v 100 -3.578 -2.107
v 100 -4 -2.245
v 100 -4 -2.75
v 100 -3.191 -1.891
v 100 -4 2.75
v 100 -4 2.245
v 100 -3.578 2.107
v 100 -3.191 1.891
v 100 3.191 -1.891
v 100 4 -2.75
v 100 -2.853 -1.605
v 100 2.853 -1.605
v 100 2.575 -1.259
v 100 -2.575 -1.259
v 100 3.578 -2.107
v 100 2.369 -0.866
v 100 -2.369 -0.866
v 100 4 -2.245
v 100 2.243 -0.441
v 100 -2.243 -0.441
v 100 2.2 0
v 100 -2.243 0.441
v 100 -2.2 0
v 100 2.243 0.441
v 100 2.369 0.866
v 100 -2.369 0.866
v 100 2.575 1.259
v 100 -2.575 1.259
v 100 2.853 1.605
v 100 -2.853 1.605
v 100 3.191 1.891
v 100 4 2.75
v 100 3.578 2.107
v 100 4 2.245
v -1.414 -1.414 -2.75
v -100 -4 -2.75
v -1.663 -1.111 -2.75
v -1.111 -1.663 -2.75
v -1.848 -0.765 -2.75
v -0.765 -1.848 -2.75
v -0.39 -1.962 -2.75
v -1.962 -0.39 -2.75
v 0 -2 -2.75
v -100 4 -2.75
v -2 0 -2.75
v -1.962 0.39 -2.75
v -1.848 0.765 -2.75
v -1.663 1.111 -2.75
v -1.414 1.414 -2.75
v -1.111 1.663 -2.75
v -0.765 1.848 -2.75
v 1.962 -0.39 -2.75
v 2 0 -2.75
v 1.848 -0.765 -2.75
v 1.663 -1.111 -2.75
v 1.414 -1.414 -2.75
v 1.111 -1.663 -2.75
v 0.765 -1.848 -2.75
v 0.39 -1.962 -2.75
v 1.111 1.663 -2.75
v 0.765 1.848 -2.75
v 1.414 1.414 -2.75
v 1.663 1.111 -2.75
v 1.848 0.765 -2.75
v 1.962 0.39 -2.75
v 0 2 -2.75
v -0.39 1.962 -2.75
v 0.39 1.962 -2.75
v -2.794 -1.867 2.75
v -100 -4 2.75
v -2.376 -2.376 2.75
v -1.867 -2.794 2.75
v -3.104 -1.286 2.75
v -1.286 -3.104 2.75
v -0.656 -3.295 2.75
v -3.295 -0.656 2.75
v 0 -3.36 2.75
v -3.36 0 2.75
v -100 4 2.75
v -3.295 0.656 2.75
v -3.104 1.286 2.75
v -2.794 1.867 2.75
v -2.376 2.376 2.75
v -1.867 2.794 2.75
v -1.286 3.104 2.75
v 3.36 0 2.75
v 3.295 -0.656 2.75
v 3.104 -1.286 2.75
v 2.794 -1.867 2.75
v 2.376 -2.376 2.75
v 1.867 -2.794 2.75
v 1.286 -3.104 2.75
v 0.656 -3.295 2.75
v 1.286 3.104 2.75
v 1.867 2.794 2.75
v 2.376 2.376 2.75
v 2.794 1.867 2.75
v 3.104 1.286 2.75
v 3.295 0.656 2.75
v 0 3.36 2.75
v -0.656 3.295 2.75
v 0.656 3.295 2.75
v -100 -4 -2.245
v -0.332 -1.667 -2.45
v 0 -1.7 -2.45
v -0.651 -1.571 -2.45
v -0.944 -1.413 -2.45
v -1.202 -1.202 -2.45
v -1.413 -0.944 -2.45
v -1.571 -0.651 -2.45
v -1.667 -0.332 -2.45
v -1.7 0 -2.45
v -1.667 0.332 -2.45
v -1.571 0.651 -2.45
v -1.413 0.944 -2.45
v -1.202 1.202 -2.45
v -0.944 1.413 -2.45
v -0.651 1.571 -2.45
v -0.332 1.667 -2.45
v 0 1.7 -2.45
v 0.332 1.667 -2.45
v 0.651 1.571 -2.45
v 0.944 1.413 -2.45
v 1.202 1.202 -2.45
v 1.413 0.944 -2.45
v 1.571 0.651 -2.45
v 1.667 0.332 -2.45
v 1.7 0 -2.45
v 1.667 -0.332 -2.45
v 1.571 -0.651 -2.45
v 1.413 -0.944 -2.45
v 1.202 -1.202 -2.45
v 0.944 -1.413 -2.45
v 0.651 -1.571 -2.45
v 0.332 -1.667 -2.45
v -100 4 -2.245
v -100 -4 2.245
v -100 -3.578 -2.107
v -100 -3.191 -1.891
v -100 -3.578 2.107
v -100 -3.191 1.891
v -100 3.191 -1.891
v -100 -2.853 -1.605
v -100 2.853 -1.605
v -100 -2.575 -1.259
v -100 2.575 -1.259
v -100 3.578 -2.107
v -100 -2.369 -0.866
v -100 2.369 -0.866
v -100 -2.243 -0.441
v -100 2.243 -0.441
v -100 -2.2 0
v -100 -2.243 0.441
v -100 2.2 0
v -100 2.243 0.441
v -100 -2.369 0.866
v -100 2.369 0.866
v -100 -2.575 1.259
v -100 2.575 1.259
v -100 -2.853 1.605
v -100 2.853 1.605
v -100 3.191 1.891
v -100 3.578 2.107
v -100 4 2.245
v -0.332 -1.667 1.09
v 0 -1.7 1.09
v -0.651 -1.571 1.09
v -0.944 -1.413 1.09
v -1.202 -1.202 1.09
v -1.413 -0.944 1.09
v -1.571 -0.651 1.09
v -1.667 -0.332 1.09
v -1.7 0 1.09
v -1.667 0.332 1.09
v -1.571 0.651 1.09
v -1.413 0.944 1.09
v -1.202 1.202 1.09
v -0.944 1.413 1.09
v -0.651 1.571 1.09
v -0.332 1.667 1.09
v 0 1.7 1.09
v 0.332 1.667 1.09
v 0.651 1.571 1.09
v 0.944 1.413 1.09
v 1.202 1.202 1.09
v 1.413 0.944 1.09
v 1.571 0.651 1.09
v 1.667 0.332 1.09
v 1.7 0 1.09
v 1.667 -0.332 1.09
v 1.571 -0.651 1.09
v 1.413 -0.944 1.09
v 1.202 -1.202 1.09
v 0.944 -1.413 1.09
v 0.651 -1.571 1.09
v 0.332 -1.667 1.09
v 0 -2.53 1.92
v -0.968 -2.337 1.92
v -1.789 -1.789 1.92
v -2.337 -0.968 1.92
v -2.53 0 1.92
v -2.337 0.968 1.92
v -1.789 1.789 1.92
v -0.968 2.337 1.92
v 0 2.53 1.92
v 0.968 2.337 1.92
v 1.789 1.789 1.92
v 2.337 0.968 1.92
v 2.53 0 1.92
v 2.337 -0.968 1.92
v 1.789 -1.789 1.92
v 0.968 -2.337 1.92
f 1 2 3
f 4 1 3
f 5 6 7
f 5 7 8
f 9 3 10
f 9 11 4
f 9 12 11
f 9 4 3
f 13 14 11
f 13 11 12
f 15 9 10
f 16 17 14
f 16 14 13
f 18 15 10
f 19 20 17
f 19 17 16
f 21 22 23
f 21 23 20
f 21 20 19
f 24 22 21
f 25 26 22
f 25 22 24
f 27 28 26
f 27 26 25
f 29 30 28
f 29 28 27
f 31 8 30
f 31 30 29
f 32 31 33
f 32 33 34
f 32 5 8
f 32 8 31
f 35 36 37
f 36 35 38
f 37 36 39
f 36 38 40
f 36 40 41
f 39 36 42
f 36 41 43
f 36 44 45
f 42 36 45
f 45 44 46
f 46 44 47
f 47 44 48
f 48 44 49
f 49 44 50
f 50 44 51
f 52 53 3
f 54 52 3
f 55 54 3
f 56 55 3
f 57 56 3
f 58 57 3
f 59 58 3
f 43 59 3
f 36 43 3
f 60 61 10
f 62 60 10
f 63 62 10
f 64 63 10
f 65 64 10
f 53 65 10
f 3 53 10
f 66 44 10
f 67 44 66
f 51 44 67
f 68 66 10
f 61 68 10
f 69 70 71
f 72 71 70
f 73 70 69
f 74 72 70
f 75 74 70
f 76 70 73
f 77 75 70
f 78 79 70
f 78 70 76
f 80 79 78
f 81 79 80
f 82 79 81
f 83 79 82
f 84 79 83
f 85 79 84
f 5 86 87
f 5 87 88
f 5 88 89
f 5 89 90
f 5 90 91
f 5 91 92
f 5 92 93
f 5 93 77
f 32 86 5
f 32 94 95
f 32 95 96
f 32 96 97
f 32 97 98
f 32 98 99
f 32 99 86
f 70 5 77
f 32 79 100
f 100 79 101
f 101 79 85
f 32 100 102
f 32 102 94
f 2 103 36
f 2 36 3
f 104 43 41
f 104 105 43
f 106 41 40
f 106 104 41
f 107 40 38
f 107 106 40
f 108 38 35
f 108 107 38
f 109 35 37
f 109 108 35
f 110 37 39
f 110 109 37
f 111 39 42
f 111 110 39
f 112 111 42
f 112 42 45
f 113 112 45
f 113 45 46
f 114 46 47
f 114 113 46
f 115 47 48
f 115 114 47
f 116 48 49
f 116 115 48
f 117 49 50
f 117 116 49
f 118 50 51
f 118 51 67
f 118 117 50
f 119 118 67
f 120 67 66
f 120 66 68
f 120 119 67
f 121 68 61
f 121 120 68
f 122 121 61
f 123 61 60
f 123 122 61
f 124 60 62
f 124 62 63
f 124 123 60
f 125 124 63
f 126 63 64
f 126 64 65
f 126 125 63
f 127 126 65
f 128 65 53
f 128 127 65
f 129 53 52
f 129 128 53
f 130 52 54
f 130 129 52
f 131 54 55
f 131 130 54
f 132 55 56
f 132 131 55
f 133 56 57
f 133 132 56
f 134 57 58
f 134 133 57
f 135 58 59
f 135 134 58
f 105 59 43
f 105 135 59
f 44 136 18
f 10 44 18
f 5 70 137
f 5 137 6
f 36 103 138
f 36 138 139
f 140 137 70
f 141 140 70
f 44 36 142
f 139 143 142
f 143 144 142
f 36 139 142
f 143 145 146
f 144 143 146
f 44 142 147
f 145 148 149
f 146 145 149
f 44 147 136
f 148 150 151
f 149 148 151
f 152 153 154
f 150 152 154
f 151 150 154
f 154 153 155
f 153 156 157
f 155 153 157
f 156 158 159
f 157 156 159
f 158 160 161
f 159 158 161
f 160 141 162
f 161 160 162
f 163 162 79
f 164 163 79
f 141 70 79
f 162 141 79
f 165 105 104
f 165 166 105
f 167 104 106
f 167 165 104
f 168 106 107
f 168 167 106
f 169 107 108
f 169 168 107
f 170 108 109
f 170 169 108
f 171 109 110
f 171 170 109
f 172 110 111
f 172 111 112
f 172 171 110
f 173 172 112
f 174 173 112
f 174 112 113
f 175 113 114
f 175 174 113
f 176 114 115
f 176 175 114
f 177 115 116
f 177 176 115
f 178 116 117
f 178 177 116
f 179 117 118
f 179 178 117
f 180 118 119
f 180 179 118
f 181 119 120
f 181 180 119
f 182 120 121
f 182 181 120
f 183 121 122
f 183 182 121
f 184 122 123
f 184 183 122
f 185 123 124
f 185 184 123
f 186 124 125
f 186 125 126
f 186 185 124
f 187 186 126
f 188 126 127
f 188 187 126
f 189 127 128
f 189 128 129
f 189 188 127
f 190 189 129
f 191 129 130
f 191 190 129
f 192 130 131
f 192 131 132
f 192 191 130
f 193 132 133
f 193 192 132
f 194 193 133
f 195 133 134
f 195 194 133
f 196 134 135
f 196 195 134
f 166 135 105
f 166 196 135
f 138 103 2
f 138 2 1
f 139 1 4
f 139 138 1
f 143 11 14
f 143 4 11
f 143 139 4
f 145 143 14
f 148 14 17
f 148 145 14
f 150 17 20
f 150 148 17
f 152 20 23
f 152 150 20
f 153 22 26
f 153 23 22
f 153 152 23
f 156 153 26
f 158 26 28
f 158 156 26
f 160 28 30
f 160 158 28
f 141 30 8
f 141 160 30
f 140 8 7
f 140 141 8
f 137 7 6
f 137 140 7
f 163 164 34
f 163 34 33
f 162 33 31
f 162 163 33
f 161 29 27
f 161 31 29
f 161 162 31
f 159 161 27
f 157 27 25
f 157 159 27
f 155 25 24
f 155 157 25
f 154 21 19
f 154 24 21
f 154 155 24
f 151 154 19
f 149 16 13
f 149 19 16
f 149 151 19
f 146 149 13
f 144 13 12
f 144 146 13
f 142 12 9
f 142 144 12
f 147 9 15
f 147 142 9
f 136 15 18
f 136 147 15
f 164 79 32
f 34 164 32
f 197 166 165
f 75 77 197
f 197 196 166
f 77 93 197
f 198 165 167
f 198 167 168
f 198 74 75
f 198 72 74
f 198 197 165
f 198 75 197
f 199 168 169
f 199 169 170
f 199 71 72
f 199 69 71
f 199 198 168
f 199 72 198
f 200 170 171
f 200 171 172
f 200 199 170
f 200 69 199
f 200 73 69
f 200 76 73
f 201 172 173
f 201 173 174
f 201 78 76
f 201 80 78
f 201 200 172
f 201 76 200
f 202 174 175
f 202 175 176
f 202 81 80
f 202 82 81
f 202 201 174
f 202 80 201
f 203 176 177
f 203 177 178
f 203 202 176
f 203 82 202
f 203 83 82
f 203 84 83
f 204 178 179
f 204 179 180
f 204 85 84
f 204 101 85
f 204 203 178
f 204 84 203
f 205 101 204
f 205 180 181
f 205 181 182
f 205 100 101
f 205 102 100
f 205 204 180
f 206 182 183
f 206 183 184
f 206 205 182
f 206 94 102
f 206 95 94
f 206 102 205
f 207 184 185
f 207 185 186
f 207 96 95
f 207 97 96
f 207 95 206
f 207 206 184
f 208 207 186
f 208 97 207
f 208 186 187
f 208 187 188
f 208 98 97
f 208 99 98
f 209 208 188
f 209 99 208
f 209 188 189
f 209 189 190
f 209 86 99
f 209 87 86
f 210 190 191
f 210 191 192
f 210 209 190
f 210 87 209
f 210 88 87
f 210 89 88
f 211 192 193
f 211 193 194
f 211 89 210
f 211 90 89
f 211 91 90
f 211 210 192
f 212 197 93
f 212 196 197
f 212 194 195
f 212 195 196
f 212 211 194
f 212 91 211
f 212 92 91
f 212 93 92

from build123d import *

# Parameters (mm, degrees)
SKETCH1_W               = 200
SKETCH1_H               = 8
BOSS_EXTRUDE1_DEPTH     = 2.75
BEARING_CUTS_DEPTH      = 101.117743183
BEARING_CUTS_DEPTH_BACK = 101.117743183
SKETCH2_R               = 2.3


with BuildPart() as part:
    # Sketch1 → Boss-Extrude1 (new, symmetric)
    with BuildSketch(Plane.XY):
        Rectangle(SKETCH1_W, SKETCH1_H)
    extrude(amount=BOSS_EXTRUDE1_DEPTH, both=True)

    # Sketch2 → Bearing Cuts (cut, two sides: drawn at the far end of the back side and taken through both)
    with BuildSketch(Plane(origin=(0, 0, 0), x_dir=(0, 0, -1), z_dir=(1, 0, 0)).offset(-BEARING_CUTS_DEPTH_BACK)):
        with Locations((0, 4.5)):
            Circle(SKETCH2_R)
        with Locations((0, -4.5)):
            Circle(SKETCH2_R)
    extrude(amount=BEARING_CUTS_DEPTH + BEARING_CUTS_DEPTH_BACK, mode=Mode.SUBTRACT)

    # Sketch5 → CSK for M3 SFHCS1 (revolve, cut)
    with BuildSketch(Plane(origin=(0, 0, 2.75), x_dir=(0, -1, 0), z_dir=(1, 0, 0))):
        Polygon((0, 0), (0, 5.5), (2, 5.5), (1.7, 5.2), (1.7, 1.66), (3.36, 0), align=None)
    revolve(axis=Axis((0, 0, 9.1), (0, 0, -1)), mode=Mode.SUBTRACT)


solid = part.part
